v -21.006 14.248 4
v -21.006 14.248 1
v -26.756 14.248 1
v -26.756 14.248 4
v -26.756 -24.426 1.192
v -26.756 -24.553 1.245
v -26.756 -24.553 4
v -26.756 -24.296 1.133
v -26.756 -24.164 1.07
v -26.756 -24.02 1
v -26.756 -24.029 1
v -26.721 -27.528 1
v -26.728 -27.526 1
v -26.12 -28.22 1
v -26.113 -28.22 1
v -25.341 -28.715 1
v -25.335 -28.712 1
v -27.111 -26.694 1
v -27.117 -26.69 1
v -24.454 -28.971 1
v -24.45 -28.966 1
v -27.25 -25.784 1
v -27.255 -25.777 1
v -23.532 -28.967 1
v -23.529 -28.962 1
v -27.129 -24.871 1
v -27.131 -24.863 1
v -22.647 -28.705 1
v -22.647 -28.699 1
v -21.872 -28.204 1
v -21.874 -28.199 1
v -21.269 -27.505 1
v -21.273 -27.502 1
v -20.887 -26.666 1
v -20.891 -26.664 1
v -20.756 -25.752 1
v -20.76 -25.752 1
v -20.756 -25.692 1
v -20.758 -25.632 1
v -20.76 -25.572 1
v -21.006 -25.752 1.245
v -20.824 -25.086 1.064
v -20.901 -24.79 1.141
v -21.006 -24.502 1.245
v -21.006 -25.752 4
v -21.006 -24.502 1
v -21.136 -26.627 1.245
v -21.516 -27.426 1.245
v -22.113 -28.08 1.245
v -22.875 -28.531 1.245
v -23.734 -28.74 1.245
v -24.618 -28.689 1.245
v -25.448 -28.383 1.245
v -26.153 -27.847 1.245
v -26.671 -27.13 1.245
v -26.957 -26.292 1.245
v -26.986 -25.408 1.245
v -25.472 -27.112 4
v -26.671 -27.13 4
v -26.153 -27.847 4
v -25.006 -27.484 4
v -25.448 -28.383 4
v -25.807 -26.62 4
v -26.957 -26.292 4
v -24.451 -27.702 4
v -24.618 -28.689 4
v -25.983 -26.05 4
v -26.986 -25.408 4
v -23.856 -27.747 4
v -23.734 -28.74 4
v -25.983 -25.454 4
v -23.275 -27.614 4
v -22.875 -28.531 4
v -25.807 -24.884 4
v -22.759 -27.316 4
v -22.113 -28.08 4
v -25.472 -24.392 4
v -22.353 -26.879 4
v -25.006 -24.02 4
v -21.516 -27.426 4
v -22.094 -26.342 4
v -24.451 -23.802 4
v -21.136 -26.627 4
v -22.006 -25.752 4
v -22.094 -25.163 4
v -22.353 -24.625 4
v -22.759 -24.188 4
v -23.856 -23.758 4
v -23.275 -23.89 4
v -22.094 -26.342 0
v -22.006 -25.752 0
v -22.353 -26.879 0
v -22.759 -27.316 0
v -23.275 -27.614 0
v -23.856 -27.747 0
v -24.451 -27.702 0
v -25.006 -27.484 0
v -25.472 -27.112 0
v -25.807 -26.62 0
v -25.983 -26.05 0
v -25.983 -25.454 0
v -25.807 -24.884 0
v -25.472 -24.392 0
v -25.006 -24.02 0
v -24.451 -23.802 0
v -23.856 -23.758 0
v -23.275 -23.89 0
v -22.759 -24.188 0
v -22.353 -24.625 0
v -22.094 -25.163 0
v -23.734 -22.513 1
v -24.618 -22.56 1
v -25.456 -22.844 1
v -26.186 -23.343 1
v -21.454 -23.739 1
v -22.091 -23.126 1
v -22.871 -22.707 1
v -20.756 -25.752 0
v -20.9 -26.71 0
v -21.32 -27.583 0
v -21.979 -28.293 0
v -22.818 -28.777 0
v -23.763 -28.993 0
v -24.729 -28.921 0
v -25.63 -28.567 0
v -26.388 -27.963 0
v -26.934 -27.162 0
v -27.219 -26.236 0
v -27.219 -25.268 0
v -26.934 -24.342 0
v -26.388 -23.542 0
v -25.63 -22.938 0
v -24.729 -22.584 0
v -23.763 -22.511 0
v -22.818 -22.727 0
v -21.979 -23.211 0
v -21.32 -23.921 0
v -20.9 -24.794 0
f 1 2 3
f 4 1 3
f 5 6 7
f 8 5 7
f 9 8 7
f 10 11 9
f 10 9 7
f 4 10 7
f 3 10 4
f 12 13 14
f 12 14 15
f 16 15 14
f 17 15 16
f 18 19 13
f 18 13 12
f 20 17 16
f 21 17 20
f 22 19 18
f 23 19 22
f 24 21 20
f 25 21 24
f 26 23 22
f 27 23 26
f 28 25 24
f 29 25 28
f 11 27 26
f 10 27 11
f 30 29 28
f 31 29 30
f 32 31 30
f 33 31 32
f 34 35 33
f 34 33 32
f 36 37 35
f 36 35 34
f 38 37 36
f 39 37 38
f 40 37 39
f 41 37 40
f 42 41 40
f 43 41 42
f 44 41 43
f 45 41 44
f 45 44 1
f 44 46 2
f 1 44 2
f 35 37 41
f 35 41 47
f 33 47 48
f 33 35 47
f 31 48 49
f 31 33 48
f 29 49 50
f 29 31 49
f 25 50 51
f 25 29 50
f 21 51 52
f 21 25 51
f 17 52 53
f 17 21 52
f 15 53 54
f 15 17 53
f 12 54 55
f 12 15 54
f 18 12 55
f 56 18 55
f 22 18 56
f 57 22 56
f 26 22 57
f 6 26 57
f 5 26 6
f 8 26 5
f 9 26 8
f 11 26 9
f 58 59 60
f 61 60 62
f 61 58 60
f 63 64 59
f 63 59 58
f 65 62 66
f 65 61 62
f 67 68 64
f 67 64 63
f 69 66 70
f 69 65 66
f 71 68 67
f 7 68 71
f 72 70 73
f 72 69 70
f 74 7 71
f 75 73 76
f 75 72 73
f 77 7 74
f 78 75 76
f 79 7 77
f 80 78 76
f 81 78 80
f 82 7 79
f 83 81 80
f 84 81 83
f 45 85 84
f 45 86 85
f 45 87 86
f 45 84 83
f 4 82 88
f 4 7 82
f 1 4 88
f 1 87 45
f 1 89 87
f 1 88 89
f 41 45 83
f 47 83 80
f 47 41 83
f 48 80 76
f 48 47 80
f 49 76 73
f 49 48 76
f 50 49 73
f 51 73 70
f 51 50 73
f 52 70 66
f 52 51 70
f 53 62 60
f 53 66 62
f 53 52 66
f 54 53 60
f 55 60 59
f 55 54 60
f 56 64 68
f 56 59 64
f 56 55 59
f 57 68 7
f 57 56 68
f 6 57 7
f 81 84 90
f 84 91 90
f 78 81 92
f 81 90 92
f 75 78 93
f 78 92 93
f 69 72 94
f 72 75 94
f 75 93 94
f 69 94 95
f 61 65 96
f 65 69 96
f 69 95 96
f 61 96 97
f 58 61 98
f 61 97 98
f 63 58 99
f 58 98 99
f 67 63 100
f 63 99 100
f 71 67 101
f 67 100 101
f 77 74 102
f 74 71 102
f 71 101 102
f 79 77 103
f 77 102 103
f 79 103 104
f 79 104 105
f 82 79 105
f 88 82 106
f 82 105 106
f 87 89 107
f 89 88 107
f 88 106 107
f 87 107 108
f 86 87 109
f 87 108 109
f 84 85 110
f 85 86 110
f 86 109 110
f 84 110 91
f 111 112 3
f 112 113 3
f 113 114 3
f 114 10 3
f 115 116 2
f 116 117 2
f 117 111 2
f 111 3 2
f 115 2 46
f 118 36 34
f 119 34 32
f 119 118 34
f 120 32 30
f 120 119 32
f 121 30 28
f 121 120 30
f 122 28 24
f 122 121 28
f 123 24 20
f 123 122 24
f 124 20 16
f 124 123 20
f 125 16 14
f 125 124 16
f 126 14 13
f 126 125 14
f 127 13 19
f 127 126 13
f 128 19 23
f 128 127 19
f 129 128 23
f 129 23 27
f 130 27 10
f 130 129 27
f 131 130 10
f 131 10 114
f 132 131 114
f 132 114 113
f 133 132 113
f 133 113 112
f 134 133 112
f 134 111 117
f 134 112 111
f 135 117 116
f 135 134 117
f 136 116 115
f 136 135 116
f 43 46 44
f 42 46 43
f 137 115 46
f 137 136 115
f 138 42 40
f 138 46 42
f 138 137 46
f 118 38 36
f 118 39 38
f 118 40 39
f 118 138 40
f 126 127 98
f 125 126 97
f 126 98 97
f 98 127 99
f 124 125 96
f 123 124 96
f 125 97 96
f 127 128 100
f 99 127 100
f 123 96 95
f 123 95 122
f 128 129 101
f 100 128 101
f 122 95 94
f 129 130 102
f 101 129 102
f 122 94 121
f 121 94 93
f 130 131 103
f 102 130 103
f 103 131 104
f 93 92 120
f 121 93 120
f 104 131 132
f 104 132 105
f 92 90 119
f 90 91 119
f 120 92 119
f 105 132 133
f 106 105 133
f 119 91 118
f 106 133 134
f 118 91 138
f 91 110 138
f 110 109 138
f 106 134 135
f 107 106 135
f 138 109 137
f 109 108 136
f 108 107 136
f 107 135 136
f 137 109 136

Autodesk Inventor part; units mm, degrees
ref_plane "YZ Plane" through (0, 0, 0) normal (1, 0, 0) x (0, 1, 0)
ref_plane "XZ Plane" through (0, 0, 0) normal (0, 1, 0) x (-1, 0, 0)
ref_plane "XY Plane" through (0, 0, 0) normal (0, 0, 1) x (1, 0, 0)
sketch "Sketch1" plane through (0, 0, 0) normal (0, 0, 1) x (1, 0, 0)
  circle A0 centre (-24.0055, -25.7521) radius 3.25
  circle A1 centre (-24.0055, -25.7521) radius 2
  point P0 (0, 0)
  dimension "d0" = 6.5
  dimension "d1" = 4
extrude "Extrusion1" add sketch "Sketch1" along normal blind 1
sketch "Sketch2" plane through (-24.0055, -25.7521, 1) normal (0, 0, 1) x (1, 0, 0)
  circle A0 centre (0, 0) radius 3
  circle A1 centre (0, 0) radius 2
  line L0 (0, 0) -> (-2.75, 0)
  line L1 (-2.75, 0) -> (-2.75, 40)
  line L2 (-2.75, 40) -> (0, 40)
  line L3 (0, 40) -> (0, 0)
  line L4 (0, 0) -> (3, 0)
  line L5 (3, 0) -> (3, 40)
  line L6 (3, 40) -> (0, 40)
  line L7 (0, 40) -> (0, 0)
  point P0 (24.0055, 25.7521)
  point P1 (-2.75, 1.199)
  point P2 (3, 0)
  point P3 (0, 40)
  dimension "d4" = 40
  dimension "d5" = 3
  dimension "d8" = 4
  dimension "d9" = 6
extrude "Extrusion2" add sketch "Sketch2" along normal blind 3 contours L4 A1 L3 A0 | A0 L1 L0 A1 L4 | A0 L3 L6 L5 | L3 A1 L0 L1 A0 | A0 L1 L2 L3
chamfer "Chamfer1" distance 0.245 angle 45 2 edges at (-24.6178, -28.689, 1) (-21.0055, -25.1271, 1)
properties part number "slide_clips_4mm"
